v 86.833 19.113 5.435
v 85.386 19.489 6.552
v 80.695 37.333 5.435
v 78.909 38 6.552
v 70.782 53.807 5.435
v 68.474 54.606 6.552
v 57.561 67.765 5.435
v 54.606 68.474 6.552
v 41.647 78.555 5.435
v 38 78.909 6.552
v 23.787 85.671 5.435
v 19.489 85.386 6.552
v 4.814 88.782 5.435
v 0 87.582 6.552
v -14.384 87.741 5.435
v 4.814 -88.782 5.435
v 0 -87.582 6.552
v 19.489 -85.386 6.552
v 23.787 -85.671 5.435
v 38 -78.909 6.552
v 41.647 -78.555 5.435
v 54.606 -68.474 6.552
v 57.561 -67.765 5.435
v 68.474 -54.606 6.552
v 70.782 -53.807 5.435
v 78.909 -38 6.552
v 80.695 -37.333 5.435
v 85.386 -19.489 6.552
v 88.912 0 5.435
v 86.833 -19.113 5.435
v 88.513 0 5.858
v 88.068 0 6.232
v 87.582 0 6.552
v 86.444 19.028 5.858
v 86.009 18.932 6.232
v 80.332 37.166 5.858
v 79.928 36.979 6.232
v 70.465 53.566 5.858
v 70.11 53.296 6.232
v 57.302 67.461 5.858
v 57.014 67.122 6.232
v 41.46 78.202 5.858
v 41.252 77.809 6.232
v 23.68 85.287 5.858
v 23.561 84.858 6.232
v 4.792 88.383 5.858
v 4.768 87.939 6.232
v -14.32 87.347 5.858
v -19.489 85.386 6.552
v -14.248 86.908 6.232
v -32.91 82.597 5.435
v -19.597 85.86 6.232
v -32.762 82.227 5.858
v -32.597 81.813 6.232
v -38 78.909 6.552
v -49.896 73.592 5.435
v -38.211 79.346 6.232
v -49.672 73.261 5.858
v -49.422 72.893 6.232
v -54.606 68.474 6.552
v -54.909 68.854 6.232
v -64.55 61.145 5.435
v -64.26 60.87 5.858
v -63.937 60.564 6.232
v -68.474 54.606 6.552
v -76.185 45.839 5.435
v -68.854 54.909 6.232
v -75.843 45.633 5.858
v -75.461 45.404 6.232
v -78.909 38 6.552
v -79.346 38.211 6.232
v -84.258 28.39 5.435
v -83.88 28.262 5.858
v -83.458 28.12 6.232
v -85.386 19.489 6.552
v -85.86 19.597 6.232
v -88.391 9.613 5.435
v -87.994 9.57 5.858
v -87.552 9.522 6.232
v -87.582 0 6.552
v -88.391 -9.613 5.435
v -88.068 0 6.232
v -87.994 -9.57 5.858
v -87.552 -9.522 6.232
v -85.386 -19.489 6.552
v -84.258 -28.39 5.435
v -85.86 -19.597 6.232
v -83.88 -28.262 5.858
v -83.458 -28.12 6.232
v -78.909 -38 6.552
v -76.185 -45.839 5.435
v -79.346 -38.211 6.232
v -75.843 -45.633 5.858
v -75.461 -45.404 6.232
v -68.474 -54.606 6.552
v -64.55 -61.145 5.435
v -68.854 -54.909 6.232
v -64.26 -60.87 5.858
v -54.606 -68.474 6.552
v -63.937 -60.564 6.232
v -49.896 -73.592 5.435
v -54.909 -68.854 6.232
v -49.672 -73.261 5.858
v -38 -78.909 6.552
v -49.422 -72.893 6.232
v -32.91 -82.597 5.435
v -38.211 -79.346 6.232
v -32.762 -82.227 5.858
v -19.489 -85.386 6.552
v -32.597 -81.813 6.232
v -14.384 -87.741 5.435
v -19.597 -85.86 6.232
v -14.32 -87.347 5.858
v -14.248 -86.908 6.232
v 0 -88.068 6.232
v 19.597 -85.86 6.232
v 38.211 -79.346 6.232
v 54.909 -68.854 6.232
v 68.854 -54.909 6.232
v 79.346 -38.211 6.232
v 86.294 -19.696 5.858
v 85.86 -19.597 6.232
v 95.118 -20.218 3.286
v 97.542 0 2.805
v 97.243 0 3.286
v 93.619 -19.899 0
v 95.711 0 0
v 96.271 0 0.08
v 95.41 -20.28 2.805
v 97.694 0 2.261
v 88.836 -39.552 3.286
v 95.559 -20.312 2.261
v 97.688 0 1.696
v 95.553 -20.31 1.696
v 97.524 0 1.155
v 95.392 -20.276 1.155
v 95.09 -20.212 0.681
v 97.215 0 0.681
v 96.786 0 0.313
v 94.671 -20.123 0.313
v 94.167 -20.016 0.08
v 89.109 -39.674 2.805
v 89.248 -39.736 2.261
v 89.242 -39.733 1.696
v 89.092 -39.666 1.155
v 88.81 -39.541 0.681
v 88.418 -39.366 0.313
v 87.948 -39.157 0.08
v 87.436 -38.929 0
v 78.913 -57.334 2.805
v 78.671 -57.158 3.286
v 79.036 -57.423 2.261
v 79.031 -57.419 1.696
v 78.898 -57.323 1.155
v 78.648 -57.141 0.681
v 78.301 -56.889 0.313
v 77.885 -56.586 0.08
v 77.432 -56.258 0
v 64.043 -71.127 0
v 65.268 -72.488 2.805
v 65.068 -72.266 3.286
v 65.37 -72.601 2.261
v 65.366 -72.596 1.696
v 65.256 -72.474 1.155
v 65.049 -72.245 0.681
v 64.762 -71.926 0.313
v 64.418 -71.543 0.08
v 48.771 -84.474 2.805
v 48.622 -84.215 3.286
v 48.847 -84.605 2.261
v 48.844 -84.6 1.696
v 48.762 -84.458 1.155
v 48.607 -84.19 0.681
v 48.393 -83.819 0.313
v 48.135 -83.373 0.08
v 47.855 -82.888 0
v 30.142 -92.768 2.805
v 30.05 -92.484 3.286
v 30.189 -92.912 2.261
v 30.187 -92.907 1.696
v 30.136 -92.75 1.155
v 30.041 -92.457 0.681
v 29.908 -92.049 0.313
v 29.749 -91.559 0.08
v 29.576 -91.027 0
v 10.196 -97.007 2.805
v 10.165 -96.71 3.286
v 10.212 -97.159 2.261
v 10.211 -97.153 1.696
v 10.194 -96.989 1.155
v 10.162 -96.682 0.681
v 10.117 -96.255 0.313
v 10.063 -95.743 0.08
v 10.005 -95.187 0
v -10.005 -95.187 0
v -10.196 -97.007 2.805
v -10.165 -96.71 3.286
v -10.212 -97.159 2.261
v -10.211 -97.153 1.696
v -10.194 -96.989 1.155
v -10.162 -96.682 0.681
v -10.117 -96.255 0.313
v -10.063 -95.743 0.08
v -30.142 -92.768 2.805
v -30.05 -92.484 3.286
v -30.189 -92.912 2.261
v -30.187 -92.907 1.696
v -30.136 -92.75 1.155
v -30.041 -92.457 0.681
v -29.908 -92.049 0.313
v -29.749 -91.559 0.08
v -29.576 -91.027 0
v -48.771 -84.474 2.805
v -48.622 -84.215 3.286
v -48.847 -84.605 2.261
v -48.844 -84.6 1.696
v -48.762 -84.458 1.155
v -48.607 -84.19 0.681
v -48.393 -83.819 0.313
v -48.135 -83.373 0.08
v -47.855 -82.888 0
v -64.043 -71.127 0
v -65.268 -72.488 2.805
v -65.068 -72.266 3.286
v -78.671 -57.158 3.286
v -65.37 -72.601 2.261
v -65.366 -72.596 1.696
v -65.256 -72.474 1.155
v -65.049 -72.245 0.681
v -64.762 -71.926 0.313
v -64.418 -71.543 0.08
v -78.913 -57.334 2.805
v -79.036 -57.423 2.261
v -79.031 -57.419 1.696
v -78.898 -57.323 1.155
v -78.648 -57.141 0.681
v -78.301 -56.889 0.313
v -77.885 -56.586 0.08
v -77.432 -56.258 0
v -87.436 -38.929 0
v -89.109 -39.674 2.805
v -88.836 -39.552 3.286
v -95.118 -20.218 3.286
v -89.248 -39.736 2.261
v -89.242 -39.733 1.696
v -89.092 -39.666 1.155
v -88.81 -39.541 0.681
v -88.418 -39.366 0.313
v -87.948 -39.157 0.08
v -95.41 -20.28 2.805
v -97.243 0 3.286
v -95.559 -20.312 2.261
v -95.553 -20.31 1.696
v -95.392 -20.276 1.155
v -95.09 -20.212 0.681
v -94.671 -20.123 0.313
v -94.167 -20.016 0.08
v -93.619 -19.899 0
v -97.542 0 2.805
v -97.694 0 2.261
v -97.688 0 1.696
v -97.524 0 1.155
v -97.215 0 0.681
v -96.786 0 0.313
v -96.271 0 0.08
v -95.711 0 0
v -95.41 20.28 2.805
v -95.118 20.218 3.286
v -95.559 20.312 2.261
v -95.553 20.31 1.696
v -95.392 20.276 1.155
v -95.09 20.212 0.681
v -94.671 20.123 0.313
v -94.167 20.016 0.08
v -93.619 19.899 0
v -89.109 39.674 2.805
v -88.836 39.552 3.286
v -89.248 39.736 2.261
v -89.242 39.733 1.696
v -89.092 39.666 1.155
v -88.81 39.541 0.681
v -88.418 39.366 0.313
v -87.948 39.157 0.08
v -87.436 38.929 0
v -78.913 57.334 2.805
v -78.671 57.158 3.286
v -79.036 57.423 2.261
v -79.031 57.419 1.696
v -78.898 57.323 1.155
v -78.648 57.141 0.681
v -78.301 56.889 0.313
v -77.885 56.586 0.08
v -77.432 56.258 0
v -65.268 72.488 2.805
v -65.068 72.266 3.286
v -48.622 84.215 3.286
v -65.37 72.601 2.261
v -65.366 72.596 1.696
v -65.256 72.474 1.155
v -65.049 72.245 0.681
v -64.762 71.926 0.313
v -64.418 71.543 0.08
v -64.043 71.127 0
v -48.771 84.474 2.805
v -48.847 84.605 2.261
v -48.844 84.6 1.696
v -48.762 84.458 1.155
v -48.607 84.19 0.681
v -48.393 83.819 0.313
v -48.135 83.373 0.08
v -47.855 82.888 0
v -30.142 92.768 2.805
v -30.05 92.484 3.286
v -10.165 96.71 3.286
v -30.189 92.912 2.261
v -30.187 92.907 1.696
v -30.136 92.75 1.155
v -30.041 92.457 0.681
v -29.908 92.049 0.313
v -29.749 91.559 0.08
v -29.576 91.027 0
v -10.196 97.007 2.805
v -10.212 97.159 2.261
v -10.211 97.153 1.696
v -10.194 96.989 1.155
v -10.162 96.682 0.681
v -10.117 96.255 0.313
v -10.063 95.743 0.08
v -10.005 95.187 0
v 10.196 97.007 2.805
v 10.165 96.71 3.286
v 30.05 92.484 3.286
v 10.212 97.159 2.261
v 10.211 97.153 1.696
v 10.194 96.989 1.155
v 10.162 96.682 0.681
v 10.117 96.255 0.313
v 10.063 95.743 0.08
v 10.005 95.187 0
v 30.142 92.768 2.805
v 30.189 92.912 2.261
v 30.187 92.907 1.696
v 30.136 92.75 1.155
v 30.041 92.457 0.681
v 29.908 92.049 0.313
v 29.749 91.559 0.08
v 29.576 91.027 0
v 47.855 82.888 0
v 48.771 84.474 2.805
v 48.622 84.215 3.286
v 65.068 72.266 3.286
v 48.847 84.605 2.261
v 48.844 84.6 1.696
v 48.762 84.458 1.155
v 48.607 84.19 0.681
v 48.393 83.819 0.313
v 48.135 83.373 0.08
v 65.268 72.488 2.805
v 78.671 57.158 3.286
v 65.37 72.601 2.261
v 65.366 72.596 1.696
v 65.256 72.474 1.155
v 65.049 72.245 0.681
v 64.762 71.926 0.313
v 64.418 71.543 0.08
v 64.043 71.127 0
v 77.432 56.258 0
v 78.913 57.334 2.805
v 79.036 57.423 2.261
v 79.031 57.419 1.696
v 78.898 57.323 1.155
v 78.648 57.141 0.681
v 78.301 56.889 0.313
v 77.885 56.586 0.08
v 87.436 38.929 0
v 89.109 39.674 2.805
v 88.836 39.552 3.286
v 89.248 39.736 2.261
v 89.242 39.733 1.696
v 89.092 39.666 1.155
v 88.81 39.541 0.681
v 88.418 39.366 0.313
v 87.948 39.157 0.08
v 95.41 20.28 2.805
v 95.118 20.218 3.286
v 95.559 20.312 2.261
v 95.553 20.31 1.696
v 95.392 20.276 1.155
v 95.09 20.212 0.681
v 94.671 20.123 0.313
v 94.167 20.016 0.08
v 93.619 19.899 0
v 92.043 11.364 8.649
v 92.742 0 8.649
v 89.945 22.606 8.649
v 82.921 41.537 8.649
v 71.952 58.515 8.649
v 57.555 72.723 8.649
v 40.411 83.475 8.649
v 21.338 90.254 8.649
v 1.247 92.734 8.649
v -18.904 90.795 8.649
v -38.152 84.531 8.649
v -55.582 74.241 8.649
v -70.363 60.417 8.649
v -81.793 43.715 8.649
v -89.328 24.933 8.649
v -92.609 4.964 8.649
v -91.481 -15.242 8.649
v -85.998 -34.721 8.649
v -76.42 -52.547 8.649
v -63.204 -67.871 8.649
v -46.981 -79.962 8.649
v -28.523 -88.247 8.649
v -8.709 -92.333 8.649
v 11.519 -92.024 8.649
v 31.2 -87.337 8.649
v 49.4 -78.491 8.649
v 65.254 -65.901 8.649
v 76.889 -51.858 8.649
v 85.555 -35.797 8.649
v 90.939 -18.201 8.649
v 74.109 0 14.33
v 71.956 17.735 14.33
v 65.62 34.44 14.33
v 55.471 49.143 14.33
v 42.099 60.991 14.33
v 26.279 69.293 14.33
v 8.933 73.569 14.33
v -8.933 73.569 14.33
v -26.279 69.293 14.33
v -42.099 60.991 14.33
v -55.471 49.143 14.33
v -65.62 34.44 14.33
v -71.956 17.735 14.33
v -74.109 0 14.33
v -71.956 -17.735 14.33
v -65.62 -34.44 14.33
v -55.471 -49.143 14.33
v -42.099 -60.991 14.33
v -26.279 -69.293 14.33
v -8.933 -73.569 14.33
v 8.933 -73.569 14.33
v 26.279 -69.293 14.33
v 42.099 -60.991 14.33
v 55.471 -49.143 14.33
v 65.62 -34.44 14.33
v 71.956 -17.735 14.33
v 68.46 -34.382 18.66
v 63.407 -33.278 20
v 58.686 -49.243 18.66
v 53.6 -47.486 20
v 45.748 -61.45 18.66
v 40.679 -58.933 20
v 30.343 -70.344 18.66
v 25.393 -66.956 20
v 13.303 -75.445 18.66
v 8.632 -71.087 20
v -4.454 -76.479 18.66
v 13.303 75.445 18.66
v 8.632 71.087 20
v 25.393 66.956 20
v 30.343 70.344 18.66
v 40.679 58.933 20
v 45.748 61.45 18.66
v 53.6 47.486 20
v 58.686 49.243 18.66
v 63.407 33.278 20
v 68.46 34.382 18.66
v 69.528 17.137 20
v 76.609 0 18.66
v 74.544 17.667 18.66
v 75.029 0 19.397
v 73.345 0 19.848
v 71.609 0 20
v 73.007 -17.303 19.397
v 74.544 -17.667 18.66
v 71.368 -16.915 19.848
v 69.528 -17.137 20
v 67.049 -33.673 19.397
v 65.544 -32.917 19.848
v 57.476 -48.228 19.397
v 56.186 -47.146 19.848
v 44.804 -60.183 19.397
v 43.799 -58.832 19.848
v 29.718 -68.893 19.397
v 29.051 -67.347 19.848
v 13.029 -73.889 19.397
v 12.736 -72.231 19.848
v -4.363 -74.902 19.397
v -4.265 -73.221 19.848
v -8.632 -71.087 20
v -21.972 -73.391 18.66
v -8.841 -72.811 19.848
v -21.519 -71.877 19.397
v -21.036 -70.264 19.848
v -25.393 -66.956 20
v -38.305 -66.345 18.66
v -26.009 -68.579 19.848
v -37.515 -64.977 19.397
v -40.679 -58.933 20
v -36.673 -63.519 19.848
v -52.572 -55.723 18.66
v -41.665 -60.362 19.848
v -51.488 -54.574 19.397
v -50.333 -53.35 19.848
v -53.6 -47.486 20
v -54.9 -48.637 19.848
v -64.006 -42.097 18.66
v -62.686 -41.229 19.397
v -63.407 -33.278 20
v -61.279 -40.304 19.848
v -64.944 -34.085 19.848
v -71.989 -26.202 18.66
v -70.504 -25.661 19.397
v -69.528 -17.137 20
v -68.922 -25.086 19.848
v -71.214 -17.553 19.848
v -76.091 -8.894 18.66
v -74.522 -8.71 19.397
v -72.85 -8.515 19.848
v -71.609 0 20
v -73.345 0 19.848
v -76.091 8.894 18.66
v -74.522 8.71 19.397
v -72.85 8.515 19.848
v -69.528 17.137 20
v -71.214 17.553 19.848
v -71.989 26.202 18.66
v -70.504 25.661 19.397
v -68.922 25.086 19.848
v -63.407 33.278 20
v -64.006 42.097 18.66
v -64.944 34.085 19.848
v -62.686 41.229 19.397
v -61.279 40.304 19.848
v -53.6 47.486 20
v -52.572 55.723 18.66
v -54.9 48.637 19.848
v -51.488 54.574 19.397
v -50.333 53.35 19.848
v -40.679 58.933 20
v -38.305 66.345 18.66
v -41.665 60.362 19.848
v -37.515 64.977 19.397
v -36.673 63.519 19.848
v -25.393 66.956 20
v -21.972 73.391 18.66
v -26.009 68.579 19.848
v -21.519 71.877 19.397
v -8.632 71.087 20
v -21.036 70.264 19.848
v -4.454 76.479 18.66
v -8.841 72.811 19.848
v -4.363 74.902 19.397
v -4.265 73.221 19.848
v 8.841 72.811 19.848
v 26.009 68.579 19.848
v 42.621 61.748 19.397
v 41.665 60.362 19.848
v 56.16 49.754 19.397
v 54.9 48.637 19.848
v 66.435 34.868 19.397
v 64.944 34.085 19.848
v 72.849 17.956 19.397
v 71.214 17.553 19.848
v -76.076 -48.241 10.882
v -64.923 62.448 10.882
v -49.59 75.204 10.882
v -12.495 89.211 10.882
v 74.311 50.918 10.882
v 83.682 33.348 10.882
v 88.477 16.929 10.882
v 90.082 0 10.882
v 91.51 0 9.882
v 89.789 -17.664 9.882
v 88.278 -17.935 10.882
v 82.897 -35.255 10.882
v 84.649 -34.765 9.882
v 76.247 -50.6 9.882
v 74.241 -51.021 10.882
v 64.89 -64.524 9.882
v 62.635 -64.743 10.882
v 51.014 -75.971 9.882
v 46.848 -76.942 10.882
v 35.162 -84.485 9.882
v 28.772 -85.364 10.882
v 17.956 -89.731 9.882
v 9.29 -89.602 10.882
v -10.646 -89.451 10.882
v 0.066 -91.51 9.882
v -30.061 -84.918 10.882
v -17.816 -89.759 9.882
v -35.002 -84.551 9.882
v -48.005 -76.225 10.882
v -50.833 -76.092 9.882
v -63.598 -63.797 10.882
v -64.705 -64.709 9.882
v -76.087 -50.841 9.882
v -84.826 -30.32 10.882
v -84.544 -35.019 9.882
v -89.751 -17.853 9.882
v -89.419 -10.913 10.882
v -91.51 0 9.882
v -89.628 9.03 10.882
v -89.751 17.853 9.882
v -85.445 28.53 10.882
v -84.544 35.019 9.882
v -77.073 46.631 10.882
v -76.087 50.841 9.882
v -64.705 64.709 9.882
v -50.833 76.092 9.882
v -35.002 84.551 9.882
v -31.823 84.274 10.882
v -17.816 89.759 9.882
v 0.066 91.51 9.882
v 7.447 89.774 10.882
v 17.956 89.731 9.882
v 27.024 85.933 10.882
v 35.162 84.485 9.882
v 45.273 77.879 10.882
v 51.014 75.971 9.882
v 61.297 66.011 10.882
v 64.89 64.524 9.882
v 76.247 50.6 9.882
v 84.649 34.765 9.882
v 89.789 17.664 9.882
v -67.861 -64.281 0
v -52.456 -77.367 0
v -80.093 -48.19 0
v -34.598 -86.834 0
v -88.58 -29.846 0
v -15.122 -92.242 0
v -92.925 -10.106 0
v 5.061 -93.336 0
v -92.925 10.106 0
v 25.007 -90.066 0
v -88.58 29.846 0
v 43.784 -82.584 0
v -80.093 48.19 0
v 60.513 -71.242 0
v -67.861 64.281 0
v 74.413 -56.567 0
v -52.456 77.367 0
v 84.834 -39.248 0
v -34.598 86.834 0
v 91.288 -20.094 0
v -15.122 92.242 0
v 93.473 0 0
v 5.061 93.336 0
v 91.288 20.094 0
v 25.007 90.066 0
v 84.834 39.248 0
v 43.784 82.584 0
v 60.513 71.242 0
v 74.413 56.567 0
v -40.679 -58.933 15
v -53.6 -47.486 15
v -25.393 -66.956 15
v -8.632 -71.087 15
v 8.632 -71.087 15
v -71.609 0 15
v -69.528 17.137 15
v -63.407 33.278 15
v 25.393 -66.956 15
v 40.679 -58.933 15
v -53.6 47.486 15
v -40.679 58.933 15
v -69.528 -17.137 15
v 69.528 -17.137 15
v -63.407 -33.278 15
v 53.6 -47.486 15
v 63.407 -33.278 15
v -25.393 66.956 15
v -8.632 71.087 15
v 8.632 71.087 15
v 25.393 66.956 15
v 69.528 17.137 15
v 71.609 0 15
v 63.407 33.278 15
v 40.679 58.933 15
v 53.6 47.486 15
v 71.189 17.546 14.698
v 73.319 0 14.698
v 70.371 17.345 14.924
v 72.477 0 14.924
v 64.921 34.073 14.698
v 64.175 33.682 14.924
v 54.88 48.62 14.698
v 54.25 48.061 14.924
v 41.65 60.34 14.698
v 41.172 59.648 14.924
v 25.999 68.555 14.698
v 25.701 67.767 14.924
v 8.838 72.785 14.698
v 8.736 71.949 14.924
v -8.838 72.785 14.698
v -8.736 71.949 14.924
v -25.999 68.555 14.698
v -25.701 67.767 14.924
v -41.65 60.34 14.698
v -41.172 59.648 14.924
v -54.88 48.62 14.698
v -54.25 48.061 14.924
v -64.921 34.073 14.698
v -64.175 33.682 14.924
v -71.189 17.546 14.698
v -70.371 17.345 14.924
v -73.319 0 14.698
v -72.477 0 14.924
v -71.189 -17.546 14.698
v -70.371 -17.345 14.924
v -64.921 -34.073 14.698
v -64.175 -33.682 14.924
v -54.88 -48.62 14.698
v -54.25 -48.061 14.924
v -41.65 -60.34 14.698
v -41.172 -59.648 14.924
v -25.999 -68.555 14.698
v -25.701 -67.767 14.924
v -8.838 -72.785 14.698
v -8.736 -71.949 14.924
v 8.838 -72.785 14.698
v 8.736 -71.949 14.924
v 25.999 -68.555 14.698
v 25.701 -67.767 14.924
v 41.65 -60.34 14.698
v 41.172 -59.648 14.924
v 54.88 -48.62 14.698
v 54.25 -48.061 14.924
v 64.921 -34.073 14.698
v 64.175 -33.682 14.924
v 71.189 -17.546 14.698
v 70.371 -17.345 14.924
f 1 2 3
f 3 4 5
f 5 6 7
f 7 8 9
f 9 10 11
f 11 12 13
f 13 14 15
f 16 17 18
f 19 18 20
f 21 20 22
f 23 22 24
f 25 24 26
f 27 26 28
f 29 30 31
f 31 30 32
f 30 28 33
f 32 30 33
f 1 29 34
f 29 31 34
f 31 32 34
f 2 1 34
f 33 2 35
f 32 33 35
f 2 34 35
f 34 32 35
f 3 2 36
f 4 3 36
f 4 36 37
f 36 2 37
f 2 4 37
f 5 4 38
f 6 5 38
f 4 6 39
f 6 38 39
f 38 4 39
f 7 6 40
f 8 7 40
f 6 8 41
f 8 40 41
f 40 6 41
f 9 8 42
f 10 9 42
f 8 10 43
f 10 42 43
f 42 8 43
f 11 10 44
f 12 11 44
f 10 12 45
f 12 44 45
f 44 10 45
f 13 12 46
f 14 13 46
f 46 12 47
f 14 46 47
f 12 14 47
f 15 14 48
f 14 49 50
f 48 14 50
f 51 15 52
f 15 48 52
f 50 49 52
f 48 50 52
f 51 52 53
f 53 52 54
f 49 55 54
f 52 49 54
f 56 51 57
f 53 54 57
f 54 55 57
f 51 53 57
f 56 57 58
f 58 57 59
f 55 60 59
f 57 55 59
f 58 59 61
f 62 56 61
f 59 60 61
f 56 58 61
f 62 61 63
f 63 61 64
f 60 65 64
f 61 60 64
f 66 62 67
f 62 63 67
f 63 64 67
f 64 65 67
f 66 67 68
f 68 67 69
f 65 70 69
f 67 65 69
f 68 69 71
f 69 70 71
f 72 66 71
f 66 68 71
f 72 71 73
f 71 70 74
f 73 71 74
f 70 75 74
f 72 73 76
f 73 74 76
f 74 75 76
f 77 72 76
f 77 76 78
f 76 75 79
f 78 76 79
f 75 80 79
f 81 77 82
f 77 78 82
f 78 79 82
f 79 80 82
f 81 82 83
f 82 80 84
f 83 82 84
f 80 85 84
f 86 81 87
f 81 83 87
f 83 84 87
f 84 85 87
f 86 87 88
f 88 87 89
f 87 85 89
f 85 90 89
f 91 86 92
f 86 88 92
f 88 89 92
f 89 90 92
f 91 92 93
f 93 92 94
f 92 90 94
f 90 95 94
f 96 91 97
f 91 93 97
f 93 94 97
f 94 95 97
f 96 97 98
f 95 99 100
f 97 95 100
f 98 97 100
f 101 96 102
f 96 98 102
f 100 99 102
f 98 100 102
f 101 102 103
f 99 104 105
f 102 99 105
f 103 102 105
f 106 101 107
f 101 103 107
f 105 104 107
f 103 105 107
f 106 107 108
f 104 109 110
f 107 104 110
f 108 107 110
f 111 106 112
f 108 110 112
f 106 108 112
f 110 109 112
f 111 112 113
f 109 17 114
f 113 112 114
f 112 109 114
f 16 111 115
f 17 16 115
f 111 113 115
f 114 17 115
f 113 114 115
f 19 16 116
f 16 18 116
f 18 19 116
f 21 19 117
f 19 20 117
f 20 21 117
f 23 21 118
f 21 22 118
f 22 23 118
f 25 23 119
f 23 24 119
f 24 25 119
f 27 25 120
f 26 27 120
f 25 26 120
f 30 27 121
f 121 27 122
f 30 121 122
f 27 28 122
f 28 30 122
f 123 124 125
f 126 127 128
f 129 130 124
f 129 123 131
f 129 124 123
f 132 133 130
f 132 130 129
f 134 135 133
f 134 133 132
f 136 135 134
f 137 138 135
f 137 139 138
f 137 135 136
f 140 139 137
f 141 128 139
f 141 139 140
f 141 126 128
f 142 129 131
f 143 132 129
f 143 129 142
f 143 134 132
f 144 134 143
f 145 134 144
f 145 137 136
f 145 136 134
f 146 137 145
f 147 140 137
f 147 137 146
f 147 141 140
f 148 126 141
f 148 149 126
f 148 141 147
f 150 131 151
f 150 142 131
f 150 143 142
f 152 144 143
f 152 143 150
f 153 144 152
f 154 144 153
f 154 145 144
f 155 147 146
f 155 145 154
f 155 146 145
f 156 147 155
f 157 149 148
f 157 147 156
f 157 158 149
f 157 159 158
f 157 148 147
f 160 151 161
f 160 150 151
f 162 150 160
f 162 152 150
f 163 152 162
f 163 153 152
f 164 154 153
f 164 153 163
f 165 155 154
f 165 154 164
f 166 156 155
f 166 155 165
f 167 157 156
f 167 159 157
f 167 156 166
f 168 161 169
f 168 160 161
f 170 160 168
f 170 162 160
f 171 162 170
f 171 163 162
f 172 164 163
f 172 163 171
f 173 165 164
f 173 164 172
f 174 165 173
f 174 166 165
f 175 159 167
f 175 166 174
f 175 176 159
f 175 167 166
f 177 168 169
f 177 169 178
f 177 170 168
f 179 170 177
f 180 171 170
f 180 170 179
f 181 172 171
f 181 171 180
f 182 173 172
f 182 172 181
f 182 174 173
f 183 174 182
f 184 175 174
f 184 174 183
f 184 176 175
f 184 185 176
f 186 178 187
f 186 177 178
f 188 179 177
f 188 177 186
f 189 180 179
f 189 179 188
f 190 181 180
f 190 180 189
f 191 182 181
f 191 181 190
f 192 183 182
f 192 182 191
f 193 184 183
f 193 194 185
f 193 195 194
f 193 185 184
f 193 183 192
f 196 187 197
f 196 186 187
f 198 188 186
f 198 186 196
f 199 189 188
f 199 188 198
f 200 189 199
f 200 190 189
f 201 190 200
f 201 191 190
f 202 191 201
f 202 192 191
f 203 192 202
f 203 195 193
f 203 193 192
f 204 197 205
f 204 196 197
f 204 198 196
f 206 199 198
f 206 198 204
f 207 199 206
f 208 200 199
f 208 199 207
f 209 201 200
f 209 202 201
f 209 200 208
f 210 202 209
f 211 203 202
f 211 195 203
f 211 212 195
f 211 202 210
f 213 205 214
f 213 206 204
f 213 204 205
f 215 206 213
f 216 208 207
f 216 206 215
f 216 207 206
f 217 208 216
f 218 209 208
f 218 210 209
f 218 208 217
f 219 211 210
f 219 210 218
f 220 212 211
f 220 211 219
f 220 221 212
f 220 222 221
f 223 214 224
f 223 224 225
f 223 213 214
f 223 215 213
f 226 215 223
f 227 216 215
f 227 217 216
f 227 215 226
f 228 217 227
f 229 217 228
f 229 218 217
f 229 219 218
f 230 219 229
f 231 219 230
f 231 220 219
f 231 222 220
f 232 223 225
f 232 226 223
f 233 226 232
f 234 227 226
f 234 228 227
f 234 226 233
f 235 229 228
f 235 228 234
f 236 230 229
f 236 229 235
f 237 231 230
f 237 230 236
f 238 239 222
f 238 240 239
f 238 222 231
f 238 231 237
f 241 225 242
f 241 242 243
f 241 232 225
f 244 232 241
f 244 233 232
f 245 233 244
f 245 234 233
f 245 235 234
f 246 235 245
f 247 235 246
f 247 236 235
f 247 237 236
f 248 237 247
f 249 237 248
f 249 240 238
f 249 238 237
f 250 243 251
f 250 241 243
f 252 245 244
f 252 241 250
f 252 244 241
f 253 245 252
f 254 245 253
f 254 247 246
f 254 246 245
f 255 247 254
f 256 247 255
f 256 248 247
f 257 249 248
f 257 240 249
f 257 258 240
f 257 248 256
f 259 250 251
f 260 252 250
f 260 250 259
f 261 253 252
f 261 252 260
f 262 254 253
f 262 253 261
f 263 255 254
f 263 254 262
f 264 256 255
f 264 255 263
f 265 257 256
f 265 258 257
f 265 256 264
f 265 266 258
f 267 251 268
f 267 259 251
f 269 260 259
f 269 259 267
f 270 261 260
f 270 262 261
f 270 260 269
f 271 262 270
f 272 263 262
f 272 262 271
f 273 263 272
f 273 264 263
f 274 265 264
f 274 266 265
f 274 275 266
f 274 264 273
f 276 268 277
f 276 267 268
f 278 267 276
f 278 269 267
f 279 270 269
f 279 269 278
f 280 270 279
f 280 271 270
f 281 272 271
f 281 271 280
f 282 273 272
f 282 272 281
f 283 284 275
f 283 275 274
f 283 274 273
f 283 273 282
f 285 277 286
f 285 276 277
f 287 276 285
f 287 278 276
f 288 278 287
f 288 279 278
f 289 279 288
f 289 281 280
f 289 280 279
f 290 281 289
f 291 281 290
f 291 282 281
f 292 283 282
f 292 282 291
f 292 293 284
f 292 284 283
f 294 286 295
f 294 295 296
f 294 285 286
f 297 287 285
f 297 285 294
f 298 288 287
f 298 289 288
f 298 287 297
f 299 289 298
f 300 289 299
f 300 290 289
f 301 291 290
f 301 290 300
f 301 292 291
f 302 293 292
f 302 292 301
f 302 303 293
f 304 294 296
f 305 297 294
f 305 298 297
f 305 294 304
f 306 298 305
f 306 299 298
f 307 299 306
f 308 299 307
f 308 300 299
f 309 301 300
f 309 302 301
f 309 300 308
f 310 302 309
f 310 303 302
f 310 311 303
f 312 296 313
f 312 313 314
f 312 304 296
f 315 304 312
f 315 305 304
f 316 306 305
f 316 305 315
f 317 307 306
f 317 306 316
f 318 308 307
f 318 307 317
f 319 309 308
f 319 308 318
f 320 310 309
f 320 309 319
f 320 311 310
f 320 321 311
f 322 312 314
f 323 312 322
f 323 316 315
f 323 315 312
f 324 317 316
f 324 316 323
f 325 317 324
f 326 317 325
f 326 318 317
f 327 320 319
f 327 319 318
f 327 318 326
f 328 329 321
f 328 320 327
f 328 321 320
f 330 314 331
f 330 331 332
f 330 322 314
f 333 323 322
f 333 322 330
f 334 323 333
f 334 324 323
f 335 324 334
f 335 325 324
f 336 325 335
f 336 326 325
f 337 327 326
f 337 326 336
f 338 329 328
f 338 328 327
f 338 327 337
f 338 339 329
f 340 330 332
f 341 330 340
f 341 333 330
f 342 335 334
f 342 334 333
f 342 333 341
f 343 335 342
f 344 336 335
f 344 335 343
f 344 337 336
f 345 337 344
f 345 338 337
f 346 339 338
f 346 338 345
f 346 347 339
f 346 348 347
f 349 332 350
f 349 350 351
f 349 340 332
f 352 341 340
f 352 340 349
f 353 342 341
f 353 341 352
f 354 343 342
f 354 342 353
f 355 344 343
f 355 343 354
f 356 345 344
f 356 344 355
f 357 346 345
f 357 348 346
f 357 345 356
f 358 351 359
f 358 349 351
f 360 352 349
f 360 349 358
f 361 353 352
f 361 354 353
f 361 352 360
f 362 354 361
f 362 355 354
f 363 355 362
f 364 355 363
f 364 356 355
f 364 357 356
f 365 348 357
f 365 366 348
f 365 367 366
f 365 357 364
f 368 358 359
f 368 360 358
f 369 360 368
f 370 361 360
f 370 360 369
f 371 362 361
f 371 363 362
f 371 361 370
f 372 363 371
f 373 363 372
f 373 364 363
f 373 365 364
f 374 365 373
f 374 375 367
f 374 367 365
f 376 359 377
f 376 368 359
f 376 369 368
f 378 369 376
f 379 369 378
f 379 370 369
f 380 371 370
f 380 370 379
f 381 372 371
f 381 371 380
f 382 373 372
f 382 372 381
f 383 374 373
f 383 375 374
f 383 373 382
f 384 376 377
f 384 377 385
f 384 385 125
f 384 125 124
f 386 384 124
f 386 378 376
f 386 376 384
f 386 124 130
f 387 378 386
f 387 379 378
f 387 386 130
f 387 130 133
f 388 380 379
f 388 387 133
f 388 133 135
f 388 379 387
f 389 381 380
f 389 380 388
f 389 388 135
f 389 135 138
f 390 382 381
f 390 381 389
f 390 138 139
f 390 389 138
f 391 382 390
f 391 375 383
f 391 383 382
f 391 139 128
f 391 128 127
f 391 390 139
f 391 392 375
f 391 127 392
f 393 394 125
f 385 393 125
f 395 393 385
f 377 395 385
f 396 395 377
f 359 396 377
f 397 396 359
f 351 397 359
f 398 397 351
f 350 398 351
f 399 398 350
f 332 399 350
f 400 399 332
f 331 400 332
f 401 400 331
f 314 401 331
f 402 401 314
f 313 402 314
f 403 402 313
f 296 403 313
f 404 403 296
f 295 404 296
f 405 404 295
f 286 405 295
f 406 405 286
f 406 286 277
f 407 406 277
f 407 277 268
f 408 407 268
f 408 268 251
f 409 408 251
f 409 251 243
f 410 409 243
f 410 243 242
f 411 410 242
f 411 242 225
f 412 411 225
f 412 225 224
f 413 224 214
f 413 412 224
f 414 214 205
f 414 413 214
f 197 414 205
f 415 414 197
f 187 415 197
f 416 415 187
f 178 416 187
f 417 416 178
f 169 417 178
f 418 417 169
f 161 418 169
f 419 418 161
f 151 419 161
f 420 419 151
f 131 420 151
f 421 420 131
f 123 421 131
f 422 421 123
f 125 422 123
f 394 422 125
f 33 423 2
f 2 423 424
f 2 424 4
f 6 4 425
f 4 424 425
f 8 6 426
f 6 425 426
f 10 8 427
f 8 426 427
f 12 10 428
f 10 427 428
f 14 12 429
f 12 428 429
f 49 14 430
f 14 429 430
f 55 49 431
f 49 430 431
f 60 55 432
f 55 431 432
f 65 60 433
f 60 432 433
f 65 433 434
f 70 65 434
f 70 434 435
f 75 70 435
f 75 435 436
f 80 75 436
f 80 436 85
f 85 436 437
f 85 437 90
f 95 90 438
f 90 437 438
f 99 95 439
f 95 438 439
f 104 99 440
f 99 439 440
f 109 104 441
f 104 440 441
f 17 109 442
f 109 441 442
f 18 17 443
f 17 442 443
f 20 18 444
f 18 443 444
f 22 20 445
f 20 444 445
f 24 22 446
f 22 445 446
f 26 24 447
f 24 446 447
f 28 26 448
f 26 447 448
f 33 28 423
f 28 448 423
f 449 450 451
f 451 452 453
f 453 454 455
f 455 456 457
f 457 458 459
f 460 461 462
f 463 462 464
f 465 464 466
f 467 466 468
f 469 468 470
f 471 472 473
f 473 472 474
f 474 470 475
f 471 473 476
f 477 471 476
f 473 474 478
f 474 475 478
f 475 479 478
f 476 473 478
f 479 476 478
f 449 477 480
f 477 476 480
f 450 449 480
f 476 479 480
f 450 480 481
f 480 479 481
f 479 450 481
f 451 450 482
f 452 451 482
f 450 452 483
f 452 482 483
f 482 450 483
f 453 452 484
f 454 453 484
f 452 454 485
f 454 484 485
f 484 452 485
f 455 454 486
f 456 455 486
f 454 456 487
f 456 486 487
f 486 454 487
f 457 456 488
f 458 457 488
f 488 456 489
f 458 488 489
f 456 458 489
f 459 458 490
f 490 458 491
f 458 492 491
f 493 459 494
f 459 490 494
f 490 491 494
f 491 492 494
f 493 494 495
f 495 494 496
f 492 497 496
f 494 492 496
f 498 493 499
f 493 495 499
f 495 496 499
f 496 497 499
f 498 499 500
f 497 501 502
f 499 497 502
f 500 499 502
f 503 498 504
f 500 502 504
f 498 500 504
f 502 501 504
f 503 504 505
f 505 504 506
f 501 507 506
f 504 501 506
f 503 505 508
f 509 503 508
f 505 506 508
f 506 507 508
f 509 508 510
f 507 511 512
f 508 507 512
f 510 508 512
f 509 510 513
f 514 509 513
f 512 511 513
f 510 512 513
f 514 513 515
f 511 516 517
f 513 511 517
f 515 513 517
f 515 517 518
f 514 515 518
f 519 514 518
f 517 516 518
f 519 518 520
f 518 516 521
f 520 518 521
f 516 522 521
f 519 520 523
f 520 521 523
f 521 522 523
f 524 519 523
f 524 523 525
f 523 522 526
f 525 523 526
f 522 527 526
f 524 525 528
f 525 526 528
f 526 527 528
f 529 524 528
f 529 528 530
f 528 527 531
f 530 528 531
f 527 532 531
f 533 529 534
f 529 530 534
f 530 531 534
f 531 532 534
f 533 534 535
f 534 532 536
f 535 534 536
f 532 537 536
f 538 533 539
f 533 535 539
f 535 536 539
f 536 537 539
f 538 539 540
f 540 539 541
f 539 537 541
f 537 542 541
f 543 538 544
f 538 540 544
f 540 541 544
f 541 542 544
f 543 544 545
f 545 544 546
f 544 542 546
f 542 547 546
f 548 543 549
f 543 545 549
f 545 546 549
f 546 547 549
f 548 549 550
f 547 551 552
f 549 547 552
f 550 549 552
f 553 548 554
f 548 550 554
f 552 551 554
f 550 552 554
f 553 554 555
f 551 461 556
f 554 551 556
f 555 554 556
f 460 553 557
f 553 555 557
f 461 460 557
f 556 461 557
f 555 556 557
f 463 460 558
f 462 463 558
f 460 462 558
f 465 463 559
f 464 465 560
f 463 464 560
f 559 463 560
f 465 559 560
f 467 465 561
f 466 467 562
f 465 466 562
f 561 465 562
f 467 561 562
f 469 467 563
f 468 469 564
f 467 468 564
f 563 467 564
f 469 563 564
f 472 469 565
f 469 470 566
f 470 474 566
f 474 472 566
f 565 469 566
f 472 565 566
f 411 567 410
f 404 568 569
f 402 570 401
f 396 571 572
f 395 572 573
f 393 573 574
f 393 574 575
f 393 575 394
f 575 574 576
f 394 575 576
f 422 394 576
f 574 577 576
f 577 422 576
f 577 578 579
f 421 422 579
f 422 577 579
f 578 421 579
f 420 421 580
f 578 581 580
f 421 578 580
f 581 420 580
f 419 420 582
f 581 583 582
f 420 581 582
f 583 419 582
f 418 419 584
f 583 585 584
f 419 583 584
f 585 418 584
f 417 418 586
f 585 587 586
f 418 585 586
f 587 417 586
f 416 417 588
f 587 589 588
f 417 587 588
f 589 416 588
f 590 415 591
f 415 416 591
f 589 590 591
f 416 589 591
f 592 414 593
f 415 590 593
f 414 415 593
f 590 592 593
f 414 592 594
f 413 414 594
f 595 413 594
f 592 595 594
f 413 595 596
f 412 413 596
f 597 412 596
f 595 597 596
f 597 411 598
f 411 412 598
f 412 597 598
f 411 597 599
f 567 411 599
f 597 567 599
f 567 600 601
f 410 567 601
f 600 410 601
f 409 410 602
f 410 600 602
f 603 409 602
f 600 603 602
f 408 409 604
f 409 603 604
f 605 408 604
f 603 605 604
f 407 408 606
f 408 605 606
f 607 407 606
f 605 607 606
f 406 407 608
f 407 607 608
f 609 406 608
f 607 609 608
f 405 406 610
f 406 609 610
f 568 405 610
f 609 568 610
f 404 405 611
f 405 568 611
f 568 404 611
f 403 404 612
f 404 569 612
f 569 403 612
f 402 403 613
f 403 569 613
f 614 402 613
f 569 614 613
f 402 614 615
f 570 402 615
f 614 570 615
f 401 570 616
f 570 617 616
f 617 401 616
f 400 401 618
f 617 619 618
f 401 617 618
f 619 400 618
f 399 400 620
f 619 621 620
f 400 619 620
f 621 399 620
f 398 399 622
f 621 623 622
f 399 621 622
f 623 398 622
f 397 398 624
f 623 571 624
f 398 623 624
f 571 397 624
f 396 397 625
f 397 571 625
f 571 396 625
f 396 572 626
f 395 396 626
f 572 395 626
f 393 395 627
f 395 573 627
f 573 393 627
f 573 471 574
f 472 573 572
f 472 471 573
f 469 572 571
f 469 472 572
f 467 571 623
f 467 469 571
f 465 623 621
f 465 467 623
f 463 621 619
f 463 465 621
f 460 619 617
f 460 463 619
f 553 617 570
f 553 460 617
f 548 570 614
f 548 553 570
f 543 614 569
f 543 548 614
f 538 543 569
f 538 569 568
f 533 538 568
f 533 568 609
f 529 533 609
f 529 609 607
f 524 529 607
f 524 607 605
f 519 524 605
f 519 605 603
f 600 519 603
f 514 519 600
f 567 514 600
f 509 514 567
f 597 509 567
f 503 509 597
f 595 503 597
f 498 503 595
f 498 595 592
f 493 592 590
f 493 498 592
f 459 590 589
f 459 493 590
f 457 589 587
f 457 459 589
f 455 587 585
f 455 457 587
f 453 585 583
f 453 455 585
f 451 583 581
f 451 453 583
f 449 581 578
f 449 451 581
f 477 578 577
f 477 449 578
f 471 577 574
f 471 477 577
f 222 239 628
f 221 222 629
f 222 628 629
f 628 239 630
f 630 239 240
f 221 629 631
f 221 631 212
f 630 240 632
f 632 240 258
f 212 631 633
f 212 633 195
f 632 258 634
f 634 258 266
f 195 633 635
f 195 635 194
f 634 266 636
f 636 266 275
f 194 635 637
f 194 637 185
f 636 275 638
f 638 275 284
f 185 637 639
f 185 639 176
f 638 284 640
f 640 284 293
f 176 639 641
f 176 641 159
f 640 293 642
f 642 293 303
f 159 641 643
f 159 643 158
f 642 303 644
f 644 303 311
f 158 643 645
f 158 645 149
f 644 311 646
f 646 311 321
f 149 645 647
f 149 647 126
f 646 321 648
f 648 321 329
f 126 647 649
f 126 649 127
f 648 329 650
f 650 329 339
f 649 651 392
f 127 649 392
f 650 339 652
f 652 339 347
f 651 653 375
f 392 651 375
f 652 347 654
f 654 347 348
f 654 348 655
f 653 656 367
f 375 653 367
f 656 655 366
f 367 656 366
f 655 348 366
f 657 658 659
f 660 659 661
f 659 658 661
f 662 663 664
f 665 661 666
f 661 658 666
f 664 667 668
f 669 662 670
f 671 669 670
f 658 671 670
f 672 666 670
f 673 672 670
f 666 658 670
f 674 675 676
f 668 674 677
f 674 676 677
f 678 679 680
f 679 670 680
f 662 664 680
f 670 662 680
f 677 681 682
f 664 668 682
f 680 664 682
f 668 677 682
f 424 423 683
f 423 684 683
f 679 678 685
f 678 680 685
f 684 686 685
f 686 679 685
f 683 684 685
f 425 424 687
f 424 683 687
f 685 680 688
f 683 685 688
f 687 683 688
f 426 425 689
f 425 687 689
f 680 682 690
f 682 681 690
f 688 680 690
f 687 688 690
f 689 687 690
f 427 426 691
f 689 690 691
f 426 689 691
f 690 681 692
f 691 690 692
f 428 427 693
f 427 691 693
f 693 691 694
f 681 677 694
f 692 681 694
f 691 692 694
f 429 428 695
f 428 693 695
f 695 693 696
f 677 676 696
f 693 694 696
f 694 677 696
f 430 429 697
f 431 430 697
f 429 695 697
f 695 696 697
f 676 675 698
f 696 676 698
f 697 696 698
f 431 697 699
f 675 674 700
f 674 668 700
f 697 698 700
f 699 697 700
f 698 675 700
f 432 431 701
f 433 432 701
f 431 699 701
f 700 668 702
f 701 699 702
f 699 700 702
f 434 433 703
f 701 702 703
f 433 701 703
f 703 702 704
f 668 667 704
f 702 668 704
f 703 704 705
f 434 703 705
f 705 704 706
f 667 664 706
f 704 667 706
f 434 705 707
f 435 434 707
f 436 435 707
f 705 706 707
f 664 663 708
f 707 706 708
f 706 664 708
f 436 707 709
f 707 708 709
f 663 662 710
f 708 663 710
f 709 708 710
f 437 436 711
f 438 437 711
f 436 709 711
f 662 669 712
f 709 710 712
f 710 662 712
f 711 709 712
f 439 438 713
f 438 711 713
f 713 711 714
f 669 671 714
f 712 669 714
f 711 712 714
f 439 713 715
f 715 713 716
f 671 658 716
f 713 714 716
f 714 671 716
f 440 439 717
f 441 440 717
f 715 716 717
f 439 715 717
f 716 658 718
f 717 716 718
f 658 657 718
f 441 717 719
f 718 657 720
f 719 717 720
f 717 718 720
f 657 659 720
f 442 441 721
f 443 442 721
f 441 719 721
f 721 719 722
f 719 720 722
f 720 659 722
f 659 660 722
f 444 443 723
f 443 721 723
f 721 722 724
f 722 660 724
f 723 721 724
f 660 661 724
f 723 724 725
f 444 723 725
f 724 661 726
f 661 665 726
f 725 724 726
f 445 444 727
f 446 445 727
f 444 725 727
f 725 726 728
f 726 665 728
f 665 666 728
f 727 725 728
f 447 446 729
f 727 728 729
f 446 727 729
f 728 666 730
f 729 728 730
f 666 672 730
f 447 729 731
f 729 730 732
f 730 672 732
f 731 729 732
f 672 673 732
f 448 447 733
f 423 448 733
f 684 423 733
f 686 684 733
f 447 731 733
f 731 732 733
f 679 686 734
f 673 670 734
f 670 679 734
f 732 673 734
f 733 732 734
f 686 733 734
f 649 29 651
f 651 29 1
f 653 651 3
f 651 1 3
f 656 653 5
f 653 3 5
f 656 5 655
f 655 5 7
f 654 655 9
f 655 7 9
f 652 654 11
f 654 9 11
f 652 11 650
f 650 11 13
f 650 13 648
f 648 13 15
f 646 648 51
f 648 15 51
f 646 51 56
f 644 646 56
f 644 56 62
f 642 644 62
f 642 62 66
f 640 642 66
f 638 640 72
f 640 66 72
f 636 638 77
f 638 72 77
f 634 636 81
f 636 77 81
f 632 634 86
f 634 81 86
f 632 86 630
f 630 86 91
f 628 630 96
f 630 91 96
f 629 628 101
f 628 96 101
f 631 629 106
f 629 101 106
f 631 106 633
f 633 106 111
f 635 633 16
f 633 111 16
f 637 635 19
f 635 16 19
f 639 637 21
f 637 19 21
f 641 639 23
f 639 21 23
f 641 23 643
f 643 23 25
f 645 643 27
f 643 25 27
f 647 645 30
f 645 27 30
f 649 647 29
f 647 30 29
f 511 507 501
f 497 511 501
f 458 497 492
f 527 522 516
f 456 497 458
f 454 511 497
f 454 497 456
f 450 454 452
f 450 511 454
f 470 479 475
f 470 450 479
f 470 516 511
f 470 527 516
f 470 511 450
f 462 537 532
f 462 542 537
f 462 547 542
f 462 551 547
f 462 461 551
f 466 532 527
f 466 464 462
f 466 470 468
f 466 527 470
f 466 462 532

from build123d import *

# Parameters (mm, degrees)
SKETCH1_R           = 100
BOSS_EXTRUDE1_DEPTH = 10
BOSS_EXTRUDE1_TAPER = 40
SKETCH2_R           = 91.609003688
BOSS_EXTRUDE2_DEPTH = 10
BOSS_EXTRUDE2_TAPER = 60
FILLET1_R           = 10
FILLET2_R           = 2


# Read off the part's stored shape, not the designer's step: Shell1
with BuildPart() as part:
    # Sketch1 → Boss-Extrude1 (new body)
    with BuildSketch(Plane.XY):
        Circle(SKETCH1_R)
    extrude(amount=BOSS_EXTRUDE1_DEPTH, taper=BOSS_EXTRUDE1_TAPER)

    # Sketch2 → Boss-Extrude2 (add)
    with BuildSketch(Plane.XY.offset(10)):
        Circle(SKETCH2_R)
    extrude(amount=BOSS_EXTRUDE2_DEPTH, taper=BOSS_EXTRUDE2_TAPER)

    # Fillet1
    fillet1_edges = [part.edges().sort_by_distance(p)[0] for p in [
        (-91.609003688, 0, 10),
        (-74.288495613, 0, 20),
    ]]
    fillet(fillet1_edges, radius=FILLET1_R)

    # Fillet2
    fillet2_edges = [part.edges().sort_by_distance(p)[0] for p in [
        (-100, 0, 0),
    ]]
    fillet(fillet2_edges, radius=FILLET2_R)

    # Shell1 outline → Shell1 (revolve, cut)
    with BuildSketch(Plane.XZ):
        with BuildLine():
            Line((93.472963553, 0), (88.912189457, 5.435318914))
            ThreePointArc((88.912189457, 5.435318914), (88.29590529, 6.051603081), (87.581967242, 6.551507885))
            Line((87.581967242, 6.551507885), (74.109003688, 14.330127019))
            ThreePointArc((74.109003688, 14.330127019), (72.903098913, 14.829629131), (71.609003688, 15))
            Line((71.609003688, 15), (0, 15))
            Line((0, 15), (0, 0))
            Line((0, 0), (93.472963553, 0))
        make_face()
    revolve(axis=Axis((0, 0, 0), (0, 0, 1)), mode=Mode.SUBTRACT)


solid = part.part
